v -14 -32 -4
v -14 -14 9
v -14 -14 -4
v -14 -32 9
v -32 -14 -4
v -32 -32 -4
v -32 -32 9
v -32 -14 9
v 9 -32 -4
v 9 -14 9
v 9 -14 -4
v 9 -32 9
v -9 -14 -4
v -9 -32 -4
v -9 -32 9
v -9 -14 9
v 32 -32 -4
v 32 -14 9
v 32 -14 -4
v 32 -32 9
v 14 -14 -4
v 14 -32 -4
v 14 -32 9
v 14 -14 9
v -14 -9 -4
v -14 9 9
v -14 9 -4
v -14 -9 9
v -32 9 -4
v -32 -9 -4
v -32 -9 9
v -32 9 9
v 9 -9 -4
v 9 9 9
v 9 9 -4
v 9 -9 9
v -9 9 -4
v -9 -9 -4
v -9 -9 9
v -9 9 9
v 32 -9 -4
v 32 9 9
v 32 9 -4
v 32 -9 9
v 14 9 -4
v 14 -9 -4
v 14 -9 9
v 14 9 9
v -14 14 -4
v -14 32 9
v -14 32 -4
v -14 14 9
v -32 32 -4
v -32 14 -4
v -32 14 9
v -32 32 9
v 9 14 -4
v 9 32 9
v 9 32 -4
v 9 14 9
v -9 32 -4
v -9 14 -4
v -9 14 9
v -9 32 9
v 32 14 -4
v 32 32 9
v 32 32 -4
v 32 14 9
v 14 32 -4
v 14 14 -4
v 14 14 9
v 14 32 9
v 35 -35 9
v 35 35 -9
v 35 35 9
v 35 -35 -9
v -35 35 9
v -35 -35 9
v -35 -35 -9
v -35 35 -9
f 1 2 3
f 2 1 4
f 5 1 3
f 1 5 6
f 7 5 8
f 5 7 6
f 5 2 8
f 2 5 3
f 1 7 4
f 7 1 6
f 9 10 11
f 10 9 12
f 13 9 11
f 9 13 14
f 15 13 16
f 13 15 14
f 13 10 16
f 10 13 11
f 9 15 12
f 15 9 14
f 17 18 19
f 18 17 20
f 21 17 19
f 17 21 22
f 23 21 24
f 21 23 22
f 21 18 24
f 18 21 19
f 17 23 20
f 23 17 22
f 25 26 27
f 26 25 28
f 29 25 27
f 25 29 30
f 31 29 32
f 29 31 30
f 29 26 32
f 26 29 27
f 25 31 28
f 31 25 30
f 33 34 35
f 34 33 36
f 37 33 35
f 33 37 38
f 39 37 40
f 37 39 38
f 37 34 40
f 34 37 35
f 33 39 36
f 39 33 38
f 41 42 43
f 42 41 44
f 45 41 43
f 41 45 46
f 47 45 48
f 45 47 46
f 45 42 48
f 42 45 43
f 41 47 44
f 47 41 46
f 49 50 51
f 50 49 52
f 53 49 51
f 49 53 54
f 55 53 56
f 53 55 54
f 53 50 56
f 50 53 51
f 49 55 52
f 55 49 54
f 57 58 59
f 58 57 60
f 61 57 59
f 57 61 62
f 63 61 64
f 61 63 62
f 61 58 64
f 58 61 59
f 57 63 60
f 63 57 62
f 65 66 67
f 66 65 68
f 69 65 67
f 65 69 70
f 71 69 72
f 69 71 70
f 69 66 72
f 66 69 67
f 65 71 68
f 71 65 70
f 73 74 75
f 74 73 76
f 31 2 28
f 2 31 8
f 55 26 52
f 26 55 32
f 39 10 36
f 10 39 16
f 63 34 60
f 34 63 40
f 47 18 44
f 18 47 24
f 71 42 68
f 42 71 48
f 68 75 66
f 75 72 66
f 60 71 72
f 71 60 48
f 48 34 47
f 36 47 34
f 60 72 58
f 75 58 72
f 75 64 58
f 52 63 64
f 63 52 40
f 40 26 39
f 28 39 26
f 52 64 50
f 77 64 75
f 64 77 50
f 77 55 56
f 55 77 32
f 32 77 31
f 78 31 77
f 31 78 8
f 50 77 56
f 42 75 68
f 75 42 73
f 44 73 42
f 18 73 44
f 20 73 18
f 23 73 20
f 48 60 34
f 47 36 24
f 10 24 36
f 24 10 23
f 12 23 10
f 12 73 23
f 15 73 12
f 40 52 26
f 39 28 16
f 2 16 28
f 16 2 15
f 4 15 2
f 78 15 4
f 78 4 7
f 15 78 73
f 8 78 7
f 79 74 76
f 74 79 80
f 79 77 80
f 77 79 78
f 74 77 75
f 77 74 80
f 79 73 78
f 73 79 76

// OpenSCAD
$fn = 32;

// ----------------------------------------------------------------------
// Pocket plate 70 x 70 x 18
// 3 x 3 pockets 18 mm square, 13 mm deep
// ----------------------------------------------------------------------

// --- parameters (mm) ---
thickness = 18;  // plate thickness
floor_t = 5;     // material left under each pocket
pocket = 18;     // pocket side length
pitch_x = 23;    // pocket pitch along X
pitch_y = 23;    // pocket pitch along Y
cols = 3;        // pockets per row
rows = 3;        // rows of pockets

// --- derived feature positions (mm) ---
depth = thickness - floor_t;        // = 13   pocket depth, down to the floor
span_x = (cols - 1) * pitch_x;      // = 46   distance between outer pockets
span_y = (rows - 1) * pitch_y;      // = 46   distance between outer pocket rows
origin_x = -span_x / 2;             // = -23   X of the first pocket
origin_y = -span_y / 2;             // = -23   Y of the first pocket
plate = [span_x + pocket + 6, span_y + pocket + 6, thickness];  // = [70, 70, 18]   overall size: pockets plus 3 mm of wall on each side
feature_centers = [
  [origin_x + 0 * pitch_x, origin_y + 0 * pitch_y],
  [origin_x + 1 * pitch_x, origin_y + 0 * pitch_y],
  [origin_x + 2 * pitch_x, origin_y + 0 * pitch_y],
  [origin_x + 0 * pitch_x, origin_y + 1 * pitch_y],
  [origin_x + 1 * pitch_x, origin_y + 1 * pitch_y],
  [origin_x + 2 * pitch_x, origin_y + 1 * pitch_y],
  [origin_x + 0 * pitch_x, origin_y + 2 * pitch_y],
  [origin_x + 1 * pitch_x, origin_y + 2 * pitch_y],
  [origin_x + 2 * pitch_x, origin_y + 2 * pitch_y]
];   // pocket centres, used verbatim by the cutter loop

// plate outline, then one pocket per centre in feature_centers
difference() {
  cube(plate, center = true);
  for (centre = feature_centers)
    translate([centre[0] - pocket / 2, centre[1] - pocket / 2, plate[2] / 2 - depth])
      cube([pocket, pocket, depth + 1]);  // centred on the declared pocket centre
}
